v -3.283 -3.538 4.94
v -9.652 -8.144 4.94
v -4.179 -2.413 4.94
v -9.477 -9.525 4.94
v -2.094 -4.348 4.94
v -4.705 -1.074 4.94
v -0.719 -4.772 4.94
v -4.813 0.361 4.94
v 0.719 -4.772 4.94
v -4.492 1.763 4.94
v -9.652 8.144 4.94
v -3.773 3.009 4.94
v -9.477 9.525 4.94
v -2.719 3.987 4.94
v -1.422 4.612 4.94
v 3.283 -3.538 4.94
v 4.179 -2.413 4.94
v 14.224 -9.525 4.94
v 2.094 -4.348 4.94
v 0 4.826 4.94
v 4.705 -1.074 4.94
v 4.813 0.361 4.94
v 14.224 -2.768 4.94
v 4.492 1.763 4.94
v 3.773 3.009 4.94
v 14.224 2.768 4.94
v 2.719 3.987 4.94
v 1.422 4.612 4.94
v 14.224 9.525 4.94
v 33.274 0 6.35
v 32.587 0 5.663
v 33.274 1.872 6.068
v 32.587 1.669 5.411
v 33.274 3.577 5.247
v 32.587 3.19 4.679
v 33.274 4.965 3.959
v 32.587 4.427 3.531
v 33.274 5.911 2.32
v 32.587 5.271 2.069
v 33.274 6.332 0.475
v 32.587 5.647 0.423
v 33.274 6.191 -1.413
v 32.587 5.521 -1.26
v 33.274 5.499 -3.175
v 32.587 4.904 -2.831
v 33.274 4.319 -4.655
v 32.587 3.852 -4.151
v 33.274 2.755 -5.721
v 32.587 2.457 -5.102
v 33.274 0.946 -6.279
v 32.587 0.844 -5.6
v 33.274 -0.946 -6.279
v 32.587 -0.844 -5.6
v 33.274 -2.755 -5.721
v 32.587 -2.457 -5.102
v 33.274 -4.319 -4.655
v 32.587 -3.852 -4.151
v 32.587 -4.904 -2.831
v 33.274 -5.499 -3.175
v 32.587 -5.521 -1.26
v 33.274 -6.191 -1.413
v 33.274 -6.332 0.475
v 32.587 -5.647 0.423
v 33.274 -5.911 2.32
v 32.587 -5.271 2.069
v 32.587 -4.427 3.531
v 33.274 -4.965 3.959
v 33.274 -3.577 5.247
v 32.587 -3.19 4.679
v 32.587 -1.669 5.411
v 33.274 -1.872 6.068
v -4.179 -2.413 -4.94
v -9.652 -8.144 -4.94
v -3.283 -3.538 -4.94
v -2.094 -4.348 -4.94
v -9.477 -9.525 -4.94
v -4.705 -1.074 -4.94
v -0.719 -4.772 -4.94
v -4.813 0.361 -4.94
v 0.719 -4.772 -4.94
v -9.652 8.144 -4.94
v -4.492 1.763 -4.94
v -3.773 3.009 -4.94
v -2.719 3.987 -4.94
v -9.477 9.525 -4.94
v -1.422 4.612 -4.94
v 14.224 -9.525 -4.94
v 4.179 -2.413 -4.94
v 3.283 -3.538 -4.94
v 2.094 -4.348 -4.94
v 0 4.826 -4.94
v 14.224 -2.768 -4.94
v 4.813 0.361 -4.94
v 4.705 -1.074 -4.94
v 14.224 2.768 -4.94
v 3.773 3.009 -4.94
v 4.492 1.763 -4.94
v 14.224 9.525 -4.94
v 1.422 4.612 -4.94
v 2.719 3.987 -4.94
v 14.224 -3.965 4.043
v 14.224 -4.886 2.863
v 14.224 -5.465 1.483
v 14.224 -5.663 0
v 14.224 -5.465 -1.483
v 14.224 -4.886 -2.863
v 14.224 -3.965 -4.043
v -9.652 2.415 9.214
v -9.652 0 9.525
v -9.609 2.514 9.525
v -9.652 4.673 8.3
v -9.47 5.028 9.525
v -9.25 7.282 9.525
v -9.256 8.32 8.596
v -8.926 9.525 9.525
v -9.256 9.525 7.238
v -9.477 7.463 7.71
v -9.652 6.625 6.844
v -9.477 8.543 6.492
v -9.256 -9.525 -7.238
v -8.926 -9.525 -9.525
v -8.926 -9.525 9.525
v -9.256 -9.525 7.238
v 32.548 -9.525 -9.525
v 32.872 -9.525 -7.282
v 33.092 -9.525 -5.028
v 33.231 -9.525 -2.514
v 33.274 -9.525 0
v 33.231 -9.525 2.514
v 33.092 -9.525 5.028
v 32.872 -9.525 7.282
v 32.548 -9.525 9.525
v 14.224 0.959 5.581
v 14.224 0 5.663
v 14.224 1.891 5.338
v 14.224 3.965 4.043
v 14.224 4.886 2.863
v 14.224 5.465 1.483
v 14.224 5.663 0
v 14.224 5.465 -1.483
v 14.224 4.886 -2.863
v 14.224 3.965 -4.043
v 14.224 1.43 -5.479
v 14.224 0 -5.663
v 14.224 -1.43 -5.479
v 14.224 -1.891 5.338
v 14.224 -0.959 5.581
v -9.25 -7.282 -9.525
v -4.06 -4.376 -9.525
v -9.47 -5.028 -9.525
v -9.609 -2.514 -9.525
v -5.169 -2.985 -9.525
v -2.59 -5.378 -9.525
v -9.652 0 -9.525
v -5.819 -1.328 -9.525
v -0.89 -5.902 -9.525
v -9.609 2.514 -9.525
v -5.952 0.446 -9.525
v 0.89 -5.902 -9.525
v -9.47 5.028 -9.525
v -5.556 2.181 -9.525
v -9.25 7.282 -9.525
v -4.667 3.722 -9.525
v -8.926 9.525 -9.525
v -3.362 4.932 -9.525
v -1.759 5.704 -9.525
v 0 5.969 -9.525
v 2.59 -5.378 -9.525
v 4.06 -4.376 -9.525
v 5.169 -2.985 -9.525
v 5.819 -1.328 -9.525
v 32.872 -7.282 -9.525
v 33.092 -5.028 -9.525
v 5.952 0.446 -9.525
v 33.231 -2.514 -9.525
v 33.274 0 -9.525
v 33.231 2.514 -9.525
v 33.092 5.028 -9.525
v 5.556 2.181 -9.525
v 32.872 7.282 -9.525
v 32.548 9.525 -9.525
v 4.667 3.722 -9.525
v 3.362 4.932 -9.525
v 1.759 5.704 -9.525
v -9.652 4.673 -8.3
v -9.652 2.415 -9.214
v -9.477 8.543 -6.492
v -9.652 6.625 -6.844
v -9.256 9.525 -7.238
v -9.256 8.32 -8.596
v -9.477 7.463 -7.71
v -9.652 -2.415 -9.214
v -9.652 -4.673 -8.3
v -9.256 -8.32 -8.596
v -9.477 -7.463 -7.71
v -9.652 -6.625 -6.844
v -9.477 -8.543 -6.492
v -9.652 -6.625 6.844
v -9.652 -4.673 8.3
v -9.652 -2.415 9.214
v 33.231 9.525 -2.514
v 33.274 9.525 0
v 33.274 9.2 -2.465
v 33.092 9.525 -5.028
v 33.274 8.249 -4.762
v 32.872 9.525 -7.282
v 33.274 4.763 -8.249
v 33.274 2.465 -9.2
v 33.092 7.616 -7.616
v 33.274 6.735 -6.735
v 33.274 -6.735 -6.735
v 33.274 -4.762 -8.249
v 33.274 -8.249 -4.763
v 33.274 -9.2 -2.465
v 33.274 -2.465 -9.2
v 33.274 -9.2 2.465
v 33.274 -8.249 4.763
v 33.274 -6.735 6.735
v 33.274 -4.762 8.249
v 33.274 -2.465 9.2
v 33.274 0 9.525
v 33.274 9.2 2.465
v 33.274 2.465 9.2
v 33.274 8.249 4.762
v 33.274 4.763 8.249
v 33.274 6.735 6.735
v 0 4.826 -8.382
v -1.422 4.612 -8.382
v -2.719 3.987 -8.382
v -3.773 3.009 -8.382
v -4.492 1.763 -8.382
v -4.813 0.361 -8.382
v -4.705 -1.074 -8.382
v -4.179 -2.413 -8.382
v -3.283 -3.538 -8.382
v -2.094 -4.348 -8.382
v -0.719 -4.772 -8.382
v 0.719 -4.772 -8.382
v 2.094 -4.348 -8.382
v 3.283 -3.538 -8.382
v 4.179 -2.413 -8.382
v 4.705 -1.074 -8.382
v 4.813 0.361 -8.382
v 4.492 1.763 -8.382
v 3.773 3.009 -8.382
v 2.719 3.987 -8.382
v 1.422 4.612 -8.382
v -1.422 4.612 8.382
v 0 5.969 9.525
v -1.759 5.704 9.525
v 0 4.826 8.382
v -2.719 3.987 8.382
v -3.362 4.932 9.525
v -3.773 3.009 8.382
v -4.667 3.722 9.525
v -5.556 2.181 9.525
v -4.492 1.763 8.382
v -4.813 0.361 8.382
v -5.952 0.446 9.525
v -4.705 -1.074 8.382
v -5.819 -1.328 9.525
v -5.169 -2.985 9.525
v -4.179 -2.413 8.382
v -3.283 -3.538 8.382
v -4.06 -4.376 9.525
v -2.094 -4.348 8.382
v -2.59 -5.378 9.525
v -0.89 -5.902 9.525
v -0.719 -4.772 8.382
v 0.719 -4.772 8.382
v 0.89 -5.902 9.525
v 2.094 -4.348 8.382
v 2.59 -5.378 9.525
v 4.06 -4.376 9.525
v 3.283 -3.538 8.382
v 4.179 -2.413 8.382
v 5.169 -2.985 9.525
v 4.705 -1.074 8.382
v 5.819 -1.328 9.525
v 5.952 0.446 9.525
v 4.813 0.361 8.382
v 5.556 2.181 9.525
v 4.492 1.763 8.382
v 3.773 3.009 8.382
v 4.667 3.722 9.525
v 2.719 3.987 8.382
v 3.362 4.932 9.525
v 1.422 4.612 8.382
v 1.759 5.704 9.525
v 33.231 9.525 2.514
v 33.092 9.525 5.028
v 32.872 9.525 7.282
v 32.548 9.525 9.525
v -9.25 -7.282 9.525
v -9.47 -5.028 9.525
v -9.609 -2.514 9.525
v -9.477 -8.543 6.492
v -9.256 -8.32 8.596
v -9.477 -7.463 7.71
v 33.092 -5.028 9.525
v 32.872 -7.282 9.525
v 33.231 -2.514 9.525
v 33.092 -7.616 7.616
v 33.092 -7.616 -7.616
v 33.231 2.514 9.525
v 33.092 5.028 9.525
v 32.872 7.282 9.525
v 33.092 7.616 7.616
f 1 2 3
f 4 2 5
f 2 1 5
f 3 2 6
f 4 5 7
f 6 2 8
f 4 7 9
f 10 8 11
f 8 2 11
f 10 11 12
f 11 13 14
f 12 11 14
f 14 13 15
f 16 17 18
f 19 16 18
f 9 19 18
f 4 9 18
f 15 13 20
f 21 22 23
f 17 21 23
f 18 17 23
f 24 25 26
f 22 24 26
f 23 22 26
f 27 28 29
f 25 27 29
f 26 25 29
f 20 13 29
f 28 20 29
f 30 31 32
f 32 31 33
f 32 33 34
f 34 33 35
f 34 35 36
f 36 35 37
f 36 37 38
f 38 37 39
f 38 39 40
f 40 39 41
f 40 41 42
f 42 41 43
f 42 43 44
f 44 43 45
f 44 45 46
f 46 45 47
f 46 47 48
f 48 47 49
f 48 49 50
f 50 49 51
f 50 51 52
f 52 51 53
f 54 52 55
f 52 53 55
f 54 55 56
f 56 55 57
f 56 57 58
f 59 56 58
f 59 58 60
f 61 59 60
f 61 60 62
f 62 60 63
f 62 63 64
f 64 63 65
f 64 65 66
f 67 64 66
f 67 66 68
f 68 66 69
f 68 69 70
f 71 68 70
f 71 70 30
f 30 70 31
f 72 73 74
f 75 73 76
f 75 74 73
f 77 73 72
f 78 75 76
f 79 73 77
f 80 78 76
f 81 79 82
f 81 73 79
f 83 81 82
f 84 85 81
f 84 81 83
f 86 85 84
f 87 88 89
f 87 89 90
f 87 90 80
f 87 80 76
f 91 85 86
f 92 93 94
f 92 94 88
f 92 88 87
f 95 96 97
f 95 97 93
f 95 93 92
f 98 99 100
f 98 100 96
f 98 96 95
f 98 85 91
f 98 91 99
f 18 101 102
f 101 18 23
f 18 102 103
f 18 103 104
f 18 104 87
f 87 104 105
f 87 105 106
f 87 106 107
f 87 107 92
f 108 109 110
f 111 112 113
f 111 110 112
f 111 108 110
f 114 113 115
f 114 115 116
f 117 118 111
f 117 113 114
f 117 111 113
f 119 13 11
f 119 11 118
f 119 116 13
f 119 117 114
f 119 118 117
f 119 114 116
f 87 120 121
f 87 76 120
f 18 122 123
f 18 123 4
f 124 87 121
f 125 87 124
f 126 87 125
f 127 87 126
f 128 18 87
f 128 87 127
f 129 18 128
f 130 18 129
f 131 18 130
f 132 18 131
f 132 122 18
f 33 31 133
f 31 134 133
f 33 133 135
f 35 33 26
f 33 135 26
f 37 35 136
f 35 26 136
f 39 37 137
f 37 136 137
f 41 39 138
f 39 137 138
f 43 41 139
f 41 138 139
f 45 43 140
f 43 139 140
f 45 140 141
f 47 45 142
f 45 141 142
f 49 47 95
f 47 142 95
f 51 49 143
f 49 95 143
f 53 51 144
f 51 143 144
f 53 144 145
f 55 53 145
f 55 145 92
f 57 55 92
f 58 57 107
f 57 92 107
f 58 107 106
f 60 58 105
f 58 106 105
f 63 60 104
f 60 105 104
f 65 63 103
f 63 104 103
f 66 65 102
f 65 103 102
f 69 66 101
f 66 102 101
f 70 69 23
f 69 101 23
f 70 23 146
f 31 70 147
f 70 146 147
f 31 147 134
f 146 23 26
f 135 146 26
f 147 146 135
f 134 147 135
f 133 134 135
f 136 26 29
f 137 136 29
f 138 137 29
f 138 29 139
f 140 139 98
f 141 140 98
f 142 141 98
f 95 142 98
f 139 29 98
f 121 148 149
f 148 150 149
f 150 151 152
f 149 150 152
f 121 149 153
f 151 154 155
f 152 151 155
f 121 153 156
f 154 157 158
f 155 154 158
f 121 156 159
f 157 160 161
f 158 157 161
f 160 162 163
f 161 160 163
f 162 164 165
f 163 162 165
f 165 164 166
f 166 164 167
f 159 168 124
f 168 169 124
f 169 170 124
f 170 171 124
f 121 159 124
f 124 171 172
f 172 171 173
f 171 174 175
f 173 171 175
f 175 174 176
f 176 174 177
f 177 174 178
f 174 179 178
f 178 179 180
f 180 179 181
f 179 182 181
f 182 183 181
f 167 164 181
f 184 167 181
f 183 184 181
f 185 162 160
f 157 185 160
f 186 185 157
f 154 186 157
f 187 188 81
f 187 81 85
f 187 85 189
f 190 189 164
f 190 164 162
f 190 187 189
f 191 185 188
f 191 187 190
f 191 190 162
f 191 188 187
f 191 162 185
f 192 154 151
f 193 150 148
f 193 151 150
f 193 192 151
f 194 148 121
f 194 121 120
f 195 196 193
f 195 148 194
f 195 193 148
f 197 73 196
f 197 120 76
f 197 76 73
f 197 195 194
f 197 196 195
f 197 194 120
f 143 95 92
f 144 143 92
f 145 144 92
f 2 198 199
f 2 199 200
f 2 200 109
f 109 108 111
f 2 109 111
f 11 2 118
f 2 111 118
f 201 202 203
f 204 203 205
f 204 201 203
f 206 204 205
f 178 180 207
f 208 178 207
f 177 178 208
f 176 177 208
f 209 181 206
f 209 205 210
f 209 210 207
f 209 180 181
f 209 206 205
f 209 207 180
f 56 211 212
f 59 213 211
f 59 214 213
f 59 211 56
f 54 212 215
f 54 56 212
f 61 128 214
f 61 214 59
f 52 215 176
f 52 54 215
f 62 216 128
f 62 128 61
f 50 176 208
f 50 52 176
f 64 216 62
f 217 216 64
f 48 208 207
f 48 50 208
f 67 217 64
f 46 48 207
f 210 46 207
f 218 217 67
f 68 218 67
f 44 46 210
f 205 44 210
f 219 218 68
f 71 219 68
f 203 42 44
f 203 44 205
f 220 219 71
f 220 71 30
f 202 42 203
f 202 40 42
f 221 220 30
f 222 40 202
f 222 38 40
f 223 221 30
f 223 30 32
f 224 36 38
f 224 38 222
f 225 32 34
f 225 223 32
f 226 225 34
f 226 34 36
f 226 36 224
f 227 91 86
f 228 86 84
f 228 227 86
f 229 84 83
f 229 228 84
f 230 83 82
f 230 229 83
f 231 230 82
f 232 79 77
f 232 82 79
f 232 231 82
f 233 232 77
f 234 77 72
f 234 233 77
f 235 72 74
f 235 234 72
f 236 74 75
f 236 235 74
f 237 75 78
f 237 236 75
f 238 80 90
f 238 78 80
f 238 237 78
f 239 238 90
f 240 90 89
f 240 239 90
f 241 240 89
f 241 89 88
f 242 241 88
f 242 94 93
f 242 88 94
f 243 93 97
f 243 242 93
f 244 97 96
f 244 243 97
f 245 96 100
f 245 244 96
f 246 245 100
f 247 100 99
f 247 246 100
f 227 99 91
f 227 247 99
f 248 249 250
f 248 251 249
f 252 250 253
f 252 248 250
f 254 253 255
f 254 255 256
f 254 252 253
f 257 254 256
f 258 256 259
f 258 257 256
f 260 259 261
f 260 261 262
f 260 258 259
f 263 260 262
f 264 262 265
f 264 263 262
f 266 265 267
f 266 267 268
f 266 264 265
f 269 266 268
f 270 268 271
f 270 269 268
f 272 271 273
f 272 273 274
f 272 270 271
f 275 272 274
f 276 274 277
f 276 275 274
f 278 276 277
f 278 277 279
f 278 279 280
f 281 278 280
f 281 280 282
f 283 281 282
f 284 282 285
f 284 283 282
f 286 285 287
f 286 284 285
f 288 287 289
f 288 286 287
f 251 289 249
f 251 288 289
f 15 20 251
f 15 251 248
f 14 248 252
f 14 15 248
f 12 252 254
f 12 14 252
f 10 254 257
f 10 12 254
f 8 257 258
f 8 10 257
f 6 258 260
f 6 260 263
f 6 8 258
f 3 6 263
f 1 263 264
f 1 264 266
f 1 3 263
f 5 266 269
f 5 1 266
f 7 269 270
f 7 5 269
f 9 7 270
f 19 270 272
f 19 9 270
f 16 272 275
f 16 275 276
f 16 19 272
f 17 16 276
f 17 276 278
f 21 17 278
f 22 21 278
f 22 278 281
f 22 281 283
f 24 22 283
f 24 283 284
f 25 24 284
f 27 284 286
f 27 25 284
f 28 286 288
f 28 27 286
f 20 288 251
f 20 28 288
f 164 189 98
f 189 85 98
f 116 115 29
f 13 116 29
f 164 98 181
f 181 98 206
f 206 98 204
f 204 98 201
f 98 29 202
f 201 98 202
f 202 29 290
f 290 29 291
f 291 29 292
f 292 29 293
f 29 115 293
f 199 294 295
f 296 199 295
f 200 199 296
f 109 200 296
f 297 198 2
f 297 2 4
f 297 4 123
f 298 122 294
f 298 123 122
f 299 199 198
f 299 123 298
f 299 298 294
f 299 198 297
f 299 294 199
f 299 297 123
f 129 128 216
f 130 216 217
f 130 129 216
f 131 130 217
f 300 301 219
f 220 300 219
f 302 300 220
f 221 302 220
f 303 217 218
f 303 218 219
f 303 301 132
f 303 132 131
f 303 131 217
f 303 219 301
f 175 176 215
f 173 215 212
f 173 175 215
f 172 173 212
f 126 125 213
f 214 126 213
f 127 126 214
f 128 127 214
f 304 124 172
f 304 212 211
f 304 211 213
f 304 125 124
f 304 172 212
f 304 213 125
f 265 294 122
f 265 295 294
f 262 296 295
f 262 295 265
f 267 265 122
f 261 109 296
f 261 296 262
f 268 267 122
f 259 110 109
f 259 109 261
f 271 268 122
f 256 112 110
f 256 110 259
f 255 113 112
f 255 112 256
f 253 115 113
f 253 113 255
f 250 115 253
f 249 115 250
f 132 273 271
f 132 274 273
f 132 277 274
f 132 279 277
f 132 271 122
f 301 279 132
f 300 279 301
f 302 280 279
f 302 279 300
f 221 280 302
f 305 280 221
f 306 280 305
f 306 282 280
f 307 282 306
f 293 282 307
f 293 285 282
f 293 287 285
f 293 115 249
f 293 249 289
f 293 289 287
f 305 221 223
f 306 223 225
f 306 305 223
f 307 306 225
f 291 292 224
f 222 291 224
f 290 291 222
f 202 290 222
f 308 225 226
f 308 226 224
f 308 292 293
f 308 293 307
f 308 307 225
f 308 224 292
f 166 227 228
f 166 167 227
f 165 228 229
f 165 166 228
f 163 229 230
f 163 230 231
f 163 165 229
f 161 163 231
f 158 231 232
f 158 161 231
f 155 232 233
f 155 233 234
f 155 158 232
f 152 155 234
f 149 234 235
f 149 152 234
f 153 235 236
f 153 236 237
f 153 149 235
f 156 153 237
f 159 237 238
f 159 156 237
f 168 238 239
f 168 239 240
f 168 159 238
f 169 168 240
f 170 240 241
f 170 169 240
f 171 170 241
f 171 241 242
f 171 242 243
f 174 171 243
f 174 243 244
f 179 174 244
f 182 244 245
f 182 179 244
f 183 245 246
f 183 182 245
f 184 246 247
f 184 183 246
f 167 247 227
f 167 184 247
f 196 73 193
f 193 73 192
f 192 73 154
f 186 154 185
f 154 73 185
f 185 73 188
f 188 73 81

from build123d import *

# Parameters (mm, degrees)
BOSS_EXTRUDE1_DEPTH      = 9.525
BOSS_EXTRUDE1_DEPTH_BACK = 9.525
SKETCH1_W                = 42.926
SKETCH1_H                = 19.05
CUT_EXTRUDE1_DEPTH       = 9.525
CUT_EXTRUDE1_DEPTH_BACK  = 9.525
SKETCH2_W                = 23.876
SKETCH2_H                = 9.8806
HOLE1_D                  = 11.32586
HOLE1_DEPTH              = 19.05
HOLE1_CSINK_D            = 12.7
HOLE1_CSINK_ANGLE        = 90


with BuildPart() as part:
    # Sketch1 → Boss-Extrude1 (new, two sides: drawn at the far end of the back side and taken through both)
    with BuildSketch(Plane.XY.offset(-BOSS_EXTRUDE1_DEPTH_BACK)):
        with Locations((11.811, 0)):
            Rectangle(SKETCH1_W, SKETCH1_H)
    extrude(amount=BOSS_EXTRUDE1_DEPTH + BOSS_EXTRUDE1_DEPTH_BACK)

    # Sketch2 → Cut-Extrude1 (cut, two sides: drawn at the far end of the back side and taken through both)
    with BuildSketch(Plane(origin=(0, 0, 0), x_dir=(1, 0, 0), z_dir=(0, 1, 0)).offset(-CUT_EXTRUDE1_DEPTH_BACK)):
        with Locations((2.286, 0)):
            Rectangle(SKETCH2_W, SKETCH2_H)
    extrude(amount=CUT_EXTRUDE1_DEPTH + CUT_EXTRUDE1_DEPTH_BACK, mode=Mode.SUBTRACT)

    # Hole1
    with Locations(Plane(origin=(33.274, 0, 0), x_dir=(0, 0, -1), z_dir=(1, 0, 0))):
        with Locations((0, 0)):
            CounterSinkHole(HOLE1_D / 2, HOLE1_CSINK_D / 2, depth=HOLE1_DEPTH, counter_sink_angle=HOLE1_CSINK_ANGLE)

    # Sketch5 → Cut-Revolve1 (revolve, cut)
    with BuildSketch(Plane(origin=(0, 0, 0), x_dir=(0, 0, -1), z_dir=(1, 0, 0))):
        Polygon((-9.525, 0), (-9.525, 5.969), (-8.382, 4.826), (8.382, 4.826), (9.525, 5.969), (9.525, 0), align=None)
    revolve(axis=Axis((0, 0, -9.525), (0, 0, 1)), mode=Mode.SUBTRACT)

    # Sketch6 → Cut-Revolve2 (revolve, cut)
    with BuildSketch(Plane.XY):
        with BuildLine():
            Line((33.274, 0), (33.274, 9.525))
            ThreePointArc((33.274, 9.525), (32.320101294, 14.371793679), (30.734, 19.05))
            Line((30.734, 19.05), (42.799, 19.05))
            Line((42.799, 19.05), (42.799, 0))
            Line((42.799, 0), (33.274, 0))
        make_face()
    revolve(axis=Axis((42.799, 0, 0), (-1, 0, 0)), mode=Mode.SUBTRACT)

    # Sketch7 → Cut-Revolve3 (revolve, cut)
    with BuildSketch(Plane.XY):
        with BuildLine():
            Line((-19.177, 0), (-19.177, 19.05))
            Line((-19.177, 19.05), (-7.112, 19.05))
            ThreePointArc((-7.112, 19.05), (-8.698101294, 14.371793679), (-9.652, 9.525))
            Line((-9.652, 9.525), (-9.652, 0))
            Line((-9.652, 0), (-19.177, 0))
        make_face()
    revolve(axis=Axis((-9.652, 0, 0), (-1, 0, 0)), mode=Mode.SUBTRACT)


solid = part.part
